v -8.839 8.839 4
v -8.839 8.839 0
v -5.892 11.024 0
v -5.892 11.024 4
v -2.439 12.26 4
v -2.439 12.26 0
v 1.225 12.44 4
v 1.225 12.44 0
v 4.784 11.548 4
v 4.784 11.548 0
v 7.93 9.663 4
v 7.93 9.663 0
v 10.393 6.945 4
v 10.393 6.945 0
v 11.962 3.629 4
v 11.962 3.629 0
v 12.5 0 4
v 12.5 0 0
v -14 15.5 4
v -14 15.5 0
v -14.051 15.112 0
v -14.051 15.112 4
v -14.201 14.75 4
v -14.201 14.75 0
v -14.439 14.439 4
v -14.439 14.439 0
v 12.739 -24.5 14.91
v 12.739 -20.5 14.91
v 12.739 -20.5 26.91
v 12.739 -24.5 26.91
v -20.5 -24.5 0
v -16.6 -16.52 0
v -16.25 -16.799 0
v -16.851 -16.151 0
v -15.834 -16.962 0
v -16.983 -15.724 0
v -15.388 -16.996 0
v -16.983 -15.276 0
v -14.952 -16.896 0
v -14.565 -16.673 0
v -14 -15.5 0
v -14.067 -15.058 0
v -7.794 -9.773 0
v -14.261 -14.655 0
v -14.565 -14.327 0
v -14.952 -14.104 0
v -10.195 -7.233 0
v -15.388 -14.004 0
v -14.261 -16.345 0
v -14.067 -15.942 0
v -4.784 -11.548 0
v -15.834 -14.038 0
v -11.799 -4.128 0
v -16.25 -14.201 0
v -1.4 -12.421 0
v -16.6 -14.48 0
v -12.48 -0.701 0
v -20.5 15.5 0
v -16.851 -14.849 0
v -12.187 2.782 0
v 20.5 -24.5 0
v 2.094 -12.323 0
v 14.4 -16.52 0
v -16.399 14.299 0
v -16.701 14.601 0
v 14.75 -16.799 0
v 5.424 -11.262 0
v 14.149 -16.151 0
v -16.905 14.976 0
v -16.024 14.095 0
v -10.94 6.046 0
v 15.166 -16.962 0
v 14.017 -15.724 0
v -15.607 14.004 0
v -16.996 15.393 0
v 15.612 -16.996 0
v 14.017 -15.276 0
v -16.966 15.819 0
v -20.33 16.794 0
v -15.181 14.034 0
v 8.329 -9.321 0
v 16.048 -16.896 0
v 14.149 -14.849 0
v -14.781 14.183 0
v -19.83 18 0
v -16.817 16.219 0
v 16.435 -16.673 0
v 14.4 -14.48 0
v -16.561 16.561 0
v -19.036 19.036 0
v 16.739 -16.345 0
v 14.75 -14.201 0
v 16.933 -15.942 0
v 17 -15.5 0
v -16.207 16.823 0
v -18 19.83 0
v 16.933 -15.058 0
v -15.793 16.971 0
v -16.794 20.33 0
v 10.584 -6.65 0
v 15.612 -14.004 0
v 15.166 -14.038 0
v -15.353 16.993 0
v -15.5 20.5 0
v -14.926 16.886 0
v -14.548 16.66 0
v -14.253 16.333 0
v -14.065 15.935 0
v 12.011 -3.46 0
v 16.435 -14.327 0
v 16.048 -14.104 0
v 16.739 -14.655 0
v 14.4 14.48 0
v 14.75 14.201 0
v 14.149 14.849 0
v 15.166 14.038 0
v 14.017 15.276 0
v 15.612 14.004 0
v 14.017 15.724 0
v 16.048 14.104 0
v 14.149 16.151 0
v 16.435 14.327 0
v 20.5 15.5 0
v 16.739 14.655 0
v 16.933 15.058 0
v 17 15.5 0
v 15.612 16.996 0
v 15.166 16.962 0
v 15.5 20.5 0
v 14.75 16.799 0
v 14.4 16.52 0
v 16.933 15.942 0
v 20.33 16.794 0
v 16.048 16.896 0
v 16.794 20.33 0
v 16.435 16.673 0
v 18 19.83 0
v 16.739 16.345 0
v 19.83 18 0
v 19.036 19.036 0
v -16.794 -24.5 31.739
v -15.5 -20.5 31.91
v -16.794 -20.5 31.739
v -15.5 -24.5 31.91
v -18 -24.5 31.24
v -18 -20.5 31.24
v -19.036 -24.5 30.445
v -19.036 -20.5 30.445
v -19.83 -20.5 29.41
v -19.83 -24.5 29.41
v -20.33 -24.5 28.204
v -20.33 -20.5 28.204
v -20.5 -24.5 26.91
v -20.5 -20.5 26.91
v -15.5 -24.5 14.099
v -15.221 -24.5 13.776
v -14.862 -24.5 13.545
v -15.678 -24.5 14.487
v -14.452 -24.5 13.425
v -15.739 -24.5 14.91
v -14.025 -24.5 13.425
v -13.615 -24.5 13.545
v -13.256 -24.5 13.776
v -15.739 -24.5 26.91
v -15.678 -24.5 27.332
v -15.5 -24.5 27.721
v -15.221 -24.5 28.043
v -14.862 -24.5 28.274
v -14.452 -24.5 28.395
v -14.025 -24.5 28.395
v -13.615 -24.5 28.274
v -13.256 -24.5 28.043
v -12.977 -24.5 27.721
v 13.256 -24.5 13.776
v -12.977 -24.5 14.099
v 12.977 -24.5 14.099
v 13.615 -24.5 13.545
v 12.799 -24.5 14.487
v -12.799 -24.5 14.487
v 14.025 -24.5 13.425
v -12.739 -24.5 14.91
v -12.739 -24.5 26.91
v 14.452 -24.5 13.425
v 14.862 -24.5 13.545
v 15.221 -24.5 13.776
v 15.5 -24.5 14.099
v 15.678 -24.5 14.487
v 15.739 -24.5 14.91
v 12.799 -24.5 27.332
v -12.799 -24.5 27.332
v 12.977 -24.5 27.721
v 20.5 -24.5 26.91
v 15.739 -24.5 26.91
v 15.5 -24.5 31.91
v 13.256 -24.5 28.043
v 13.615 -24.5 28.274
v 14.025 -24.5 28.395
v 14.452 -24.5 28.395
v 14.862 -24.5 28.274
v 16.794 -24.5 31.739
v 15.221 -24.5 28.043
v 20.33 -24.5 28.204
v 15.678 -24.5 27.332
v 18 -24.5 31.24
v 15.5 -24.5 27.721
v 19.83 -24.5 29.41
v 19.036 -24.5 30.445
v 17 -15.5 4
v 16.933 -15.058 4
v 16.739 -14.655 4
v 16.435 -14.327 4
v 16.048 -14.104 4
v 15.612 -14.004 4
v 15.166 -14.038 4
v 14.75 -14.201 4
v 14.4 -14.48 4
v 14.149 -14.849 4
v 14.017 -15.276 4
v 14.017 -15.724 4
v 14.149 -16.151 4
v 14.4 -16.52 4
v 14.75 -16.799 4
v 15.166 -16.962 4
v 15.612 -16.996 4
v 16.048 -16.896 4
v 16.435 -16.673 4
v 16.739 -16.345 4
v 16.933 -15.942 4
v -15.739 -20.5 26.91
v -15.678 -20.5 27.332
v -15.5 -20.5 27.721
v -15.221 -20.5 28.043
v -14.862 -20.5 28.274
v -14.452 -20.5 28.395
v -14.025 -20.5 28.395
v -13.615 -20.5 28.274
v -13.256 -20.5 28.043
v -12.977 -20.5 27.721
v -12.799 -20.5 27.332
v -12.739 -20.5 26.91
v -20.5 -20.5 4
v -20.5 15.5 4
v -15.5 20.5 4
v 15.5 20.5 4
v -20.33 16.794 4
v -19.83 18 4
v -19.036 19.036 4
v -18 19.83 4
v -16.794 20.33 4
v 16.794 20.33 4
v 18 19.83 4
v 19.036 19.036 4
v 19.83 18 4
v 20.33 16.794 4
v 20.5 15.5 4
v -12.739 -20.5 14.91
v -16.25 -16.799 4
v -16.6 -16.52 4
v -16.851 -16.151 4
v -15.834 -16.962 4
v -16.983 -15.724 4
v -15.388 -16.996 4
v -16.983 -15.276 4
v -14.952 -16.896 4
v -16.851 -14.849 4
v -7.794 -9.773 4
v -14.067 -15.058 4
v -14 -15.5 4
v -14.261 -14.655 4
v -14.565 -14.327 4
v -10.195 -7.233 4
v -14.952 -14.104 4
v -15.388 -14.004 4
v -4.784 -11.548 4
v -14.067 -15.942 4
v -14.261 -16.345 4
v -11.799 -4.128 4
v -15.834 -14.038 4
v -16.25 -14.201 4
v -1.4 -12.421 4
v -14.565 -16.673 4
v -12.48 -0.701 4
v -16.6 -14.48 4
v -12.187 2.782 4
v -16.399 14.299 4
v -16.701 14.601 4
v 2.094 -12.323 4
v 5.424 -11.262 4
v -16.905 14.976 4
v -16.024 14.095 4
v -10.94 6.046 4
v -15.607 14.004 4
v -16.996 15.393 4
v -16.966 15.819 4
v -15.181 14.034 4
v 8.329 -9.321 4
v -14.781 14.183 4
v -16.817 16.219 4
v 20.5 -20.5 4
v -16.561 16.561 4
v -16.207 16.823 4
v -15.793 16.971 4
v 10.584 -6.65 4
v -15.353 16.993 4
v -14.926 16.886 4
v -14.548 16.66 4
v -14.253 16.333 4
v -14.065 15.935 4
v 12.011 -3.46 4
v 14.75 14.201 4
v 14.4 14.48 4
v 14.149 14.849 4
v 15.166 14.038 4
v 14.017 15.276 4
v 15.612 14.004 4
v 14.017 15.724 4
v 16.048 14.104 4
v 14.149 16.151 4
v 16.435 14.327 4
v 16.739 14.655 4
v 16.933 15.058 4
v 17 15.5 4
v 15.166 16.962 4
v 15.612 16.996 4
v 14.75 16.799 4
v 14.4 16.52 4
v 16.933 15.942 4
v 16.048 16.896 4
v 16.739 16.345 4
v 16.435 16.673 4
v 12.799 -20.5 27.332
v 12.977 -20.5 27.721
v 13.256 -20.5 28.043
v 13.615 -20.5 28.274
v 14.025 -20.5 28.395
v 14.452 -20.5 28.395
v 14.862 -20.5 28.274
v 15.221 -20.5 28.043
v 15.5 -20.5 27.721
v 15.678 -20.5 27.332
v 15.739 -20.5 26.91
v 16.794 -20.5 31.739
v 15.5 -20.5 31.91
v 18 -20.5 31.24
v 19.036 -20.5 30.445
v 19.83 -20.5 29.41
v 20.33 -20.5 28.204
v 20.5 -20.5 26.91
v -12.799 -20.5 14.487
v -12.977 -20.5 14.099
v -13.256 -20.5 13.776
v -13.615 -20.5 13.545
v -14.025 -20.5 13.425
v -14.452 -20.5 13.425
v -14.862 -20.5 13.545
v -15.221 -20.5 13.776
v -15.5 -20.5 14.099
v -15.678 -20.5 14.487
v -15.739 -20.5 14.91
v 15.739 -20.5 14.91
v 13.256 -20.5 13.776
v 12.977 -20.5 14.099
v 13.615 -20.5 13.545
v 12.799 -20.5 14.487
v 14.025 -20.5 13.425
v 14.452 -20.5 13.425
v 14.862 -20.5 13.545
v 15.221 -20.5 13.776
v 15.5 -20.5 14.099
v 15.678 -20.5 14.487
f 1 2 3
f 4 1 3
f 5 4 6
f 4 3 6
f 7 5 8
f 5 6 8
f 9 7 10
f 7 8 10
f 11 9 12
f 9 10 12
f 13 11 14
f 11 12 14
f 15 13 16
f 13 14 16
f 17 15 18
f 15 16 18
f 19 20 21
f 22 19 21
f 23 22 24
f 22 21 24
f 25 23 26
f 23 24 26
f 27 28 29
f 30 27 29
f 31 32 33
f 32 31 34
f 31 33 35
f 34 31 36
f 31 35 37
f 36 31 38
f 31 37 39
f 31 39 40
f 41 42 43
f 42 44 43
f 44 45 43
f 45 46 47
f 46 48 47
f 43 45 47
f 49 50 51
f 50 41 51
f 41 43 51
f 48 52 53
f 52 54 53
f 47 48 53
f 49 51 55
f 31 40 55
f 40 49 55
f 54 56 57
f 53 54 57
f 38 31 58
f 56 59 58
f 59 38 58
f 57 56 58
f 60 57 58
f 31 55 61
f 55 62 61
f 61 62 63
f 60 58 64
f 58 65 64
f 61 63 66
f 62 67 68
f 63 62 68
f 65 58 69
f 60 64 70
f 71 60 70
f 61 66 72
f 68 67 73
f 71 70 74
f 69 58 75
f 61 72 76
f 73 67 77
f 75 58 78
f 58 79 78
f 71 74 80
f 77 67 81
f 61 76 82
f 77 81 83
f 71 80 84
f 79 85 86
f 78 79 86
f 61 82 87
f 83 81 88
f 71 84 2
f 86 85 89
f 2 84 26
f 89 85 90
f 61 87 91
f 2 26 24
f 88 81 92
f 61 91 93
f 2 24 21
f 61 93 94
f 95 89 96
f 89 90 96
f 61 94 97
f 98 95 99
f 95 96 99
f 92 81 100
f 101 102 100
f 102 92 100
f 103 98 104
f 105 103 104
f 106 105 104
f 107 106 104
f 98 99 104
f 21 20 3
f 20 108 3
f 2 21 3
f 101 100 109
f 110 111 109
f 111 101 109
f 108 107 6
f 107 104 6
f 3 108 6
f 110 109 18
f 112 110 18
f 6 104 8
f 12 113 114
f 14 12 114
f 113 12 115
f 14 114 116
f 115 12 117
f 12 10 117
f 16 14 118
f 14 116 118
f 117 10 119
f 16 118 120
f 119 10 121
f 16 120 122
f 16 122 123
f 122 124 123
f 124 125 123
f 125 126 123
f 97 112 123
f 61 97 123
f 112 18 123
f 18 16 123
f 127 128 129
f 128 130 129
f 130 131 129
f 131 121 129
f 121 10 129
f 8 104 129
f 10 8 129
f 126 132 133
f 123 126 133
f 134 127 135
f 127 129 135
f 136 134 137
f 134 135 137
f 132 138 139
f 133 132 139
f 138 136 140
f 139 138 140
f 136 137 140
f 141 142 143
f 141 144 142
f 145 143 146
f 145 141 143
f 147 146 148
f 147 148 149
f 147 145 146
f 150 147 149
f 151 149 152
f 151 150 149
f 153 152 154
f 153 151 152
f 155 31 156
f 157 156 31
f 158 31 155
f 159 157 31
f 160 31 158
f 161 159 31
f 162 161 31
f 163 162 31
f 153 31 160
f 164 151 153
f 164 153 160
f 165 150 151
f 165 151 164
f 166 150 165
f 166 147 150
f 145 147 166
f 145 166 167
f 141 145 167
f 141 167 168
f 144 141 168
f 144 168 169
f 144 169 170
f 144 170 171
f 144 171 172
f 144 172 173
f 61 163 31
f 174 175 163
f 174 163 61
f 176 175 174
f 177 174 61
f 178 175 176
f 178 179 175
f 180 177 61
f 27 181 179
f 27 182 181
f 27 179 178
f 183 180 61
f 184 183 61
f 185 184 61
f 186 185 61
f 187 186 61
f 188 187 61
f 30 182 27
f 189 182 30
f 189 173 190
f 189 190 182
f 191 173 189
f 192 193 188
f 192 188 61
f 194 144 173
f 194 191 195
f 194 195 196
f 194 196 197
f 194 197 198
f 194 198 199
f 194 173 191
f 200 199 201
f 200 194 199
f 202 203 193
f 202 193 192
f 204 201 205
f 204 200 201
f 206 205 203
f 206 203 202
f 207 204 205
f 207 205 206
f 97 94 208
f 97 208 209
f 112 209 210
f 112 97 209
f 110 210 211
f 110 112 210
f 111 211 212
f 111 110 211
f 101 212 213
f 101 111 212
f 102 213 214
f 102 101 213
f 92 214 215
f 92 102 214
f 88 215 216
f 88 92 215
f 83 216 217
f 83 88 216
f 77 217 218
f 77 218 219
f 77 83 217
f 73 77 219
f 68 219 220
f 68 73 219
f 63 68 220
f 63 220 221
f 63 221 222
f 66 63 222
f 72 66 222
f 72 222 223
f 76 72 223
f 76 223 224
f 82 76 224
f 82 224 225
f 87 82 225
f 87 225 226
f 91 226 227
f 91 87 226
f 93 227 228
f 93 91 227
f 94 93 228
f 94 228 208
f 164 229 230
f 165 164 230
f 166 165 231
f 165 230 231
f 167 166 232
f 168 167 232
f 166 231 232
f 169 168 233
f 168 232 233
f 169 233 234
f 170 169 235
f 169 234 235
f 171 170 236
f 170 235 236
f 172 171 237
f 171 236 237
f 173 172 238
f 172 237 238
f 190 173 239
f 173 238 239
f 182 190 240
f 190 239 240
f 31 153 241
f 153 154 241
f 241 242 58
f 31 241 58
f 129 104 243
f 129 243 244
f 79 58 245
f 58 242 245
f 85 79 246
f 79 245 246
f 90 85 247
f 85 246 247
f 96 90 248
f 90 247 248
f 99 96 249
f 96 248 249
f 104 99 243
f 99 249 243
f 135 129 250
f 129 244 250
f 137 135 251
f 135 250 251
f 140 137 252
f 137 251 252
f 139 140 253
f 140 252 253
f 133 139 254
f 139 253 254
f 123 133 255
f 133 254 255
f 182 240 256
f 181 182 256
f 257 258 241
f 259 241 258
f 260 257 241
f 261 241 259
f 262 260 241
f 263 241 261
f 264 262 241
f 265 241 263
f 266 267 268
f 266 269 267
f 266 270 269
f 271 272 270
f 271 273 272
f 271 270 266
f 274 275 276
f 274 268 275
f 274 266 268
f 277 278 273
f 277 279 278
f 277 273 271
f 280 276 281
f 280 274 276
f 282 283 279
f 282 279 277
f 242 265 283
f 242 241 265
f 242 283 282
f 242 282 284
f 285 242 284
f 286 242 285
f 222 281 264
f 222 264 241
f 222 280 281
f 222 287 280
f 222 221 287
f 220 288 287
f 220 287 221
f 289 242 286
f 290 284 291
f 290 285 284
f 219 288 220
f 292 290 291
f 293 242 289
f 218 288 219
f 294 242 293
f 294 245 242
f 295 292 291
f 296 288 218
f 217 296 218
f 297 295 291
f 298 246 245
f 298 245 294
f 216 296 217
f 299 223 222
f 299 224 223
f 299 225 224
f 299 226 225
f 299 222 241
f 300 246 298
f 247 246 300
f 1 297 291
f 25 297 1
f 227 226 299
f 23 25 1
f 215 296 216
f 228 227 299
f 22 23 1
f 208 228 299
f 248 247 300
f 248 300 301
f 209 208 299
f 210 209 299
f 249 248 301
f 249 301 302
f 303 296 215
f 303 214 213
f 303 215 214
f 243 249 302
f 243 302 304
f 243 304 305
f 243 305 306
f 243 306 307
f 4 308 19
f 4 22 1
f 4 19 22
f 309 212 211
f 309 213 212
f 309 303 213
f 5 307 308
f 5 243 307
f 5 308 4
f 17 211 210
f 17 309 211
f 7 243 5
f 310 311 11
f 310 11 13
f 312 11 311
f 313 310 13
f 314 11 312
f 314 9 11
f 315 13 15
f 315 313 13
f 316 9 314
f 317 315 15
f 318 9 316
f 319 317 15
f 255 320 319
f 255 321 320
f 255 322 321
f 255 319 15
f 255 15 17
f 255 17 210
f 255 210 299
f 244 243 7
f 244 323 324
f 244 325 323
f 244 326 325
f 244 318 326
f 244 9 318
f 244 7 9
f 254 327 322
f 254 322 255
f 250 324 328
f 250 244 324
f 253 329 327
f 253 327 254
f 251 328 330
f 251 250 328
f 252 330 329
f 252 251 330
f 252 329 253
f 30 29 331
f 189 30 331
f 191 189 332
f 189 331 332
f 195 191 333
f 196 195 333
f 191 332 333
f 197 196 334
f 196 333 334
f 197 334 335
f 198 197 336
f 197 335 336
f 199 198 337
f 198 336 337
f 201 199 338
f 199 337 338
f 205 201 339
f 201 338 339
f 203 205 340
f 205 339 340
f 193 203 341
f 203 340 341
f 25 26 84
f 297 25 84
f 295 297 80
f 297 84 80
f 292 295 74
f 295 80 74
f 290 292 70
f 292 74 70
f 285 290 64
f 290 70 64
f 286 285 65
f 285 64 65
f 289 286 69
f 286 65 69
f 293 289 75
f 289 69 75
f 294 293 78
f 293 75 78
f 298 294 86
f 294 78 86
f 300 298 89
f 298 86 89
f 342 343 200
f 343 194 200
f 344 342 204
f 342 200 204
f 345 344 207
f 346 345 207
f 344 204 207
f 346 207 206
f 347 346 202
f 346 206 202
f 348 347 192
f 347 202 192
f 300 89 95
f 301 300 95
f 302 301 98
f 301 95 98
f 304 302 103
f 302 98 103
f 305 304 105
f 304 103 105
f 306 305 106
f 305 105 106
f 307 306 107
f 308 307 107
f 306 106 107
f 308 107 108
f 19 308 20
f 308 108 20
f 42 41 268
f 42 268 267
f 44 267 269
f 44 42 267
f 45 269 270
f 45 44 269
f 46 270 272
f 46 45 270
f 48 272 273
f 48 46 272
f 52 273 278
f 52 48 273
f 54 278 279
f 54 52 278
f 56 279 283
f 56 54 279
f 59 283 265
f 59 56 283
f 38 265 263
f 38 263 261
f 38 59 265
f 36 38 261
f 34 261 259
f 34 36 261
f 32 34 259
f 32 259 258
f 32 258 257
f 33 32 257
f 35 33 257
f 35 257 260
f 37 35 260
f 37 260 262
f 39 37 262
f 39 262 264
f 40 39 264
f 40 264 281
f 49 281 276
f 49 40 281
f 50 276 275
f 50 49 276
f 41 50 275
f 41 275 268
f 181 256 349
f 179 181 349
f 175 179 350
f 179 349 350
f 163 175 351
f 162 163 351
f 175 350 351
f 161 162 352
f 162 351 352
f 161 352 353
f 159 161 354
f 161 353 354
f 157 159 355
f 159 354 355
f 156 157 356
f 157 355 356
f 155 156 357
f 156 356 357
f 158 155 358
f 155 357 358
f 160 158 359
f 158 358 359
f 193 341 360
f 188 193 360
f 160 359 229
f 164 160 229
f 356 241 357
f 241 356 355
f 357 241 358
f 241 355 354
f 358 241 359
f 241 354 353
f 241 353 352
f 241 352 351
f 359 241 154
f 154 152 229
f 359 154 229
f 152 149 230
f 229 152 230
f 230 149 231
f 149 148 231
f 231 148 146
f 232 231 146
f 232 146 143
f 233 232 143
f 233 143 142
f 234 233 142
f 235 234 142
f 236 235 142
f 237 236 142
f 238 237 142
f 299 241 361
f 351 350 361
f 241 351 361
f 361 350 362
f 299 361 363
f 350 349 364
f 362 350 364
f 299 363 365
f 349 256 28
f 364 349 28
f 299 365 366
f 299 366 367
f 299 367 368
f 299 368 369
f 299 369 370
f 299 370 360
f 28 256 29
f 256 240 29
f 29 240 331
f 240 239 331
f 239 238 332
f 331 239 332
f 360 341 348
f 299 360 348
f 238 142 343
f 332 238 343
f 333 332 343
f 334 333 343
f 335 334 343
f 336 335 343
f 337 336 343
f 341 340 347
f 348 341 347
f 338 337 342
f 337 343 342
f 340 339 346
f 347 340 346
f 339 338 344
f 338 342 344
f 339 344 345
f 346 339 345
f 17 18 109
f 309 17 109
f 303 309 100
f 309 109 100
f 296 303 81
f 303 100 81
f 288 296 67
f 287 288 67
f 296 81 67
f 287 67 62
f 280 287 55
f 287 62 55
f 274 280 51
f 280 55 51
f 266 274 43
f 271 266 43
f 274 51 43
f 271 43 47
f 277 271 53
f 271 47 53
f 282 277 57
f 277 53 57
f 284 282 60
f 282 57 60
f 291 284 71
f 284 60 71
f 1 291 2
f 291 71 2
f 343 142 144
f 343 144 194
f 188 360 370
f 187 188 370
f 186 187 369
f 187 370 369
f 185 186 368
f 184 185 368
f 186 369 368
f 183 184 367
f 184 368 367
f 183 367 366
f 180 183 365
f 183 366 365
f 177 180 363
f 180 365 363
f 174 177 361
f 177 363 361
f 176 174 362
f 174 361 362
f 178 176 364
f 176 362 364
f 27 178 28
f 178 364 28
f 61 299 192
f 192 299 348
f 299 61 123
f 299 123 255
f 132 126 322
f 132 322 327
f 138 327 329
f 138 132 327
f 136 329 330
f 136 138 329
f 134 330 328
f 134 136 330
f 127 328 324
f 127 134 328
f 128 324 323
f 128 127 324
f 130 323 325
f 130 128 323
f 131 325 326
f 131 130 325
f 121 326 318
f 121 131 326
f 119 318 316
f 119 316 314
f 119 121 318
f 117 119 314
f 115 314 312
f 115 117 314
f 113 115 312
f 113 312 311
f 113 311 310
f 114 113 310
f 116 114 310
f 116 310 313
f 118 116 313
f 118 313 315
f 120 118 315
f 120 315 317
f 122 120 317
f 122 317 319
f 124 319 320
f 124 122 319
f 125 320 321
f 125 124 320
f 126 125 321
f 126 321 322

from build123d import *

# Parameters (mm, degrees)
F0_W     = 41
F0_H     = 41
F0_R     = 1.5
F1_DEPTH = 4
F2_R     = 5
F3_W     = 41
F3_H     = 27.909843
F3_H_2   = 4
F4_DEPTH = 4
F5_R     = 5


with BuildPart() as f1:
    # F0 (on Top) → F1 (new body)
    with BuildSketch(Plane.XY):
        Rectangle(F0_W, F0_H)
        with Locations((-15.5, -15.5)):
            Circle(F0_R, mode=Mode.SUBTRACT)
        with Locations((15.5, -15.5)):
            Circle(F0_R, mode=Mode.SUBTRACT)
        with BuildLine():
            ThreePointArc((-14.43934, 14.43934), (-16.56066, 14.43934), (-16.56066, 16.56066))
            ThreePointArc((-16.56066, 16.56066), (-14.925975, 16.885819), (-14, 15.5))
            ThreePointArc((-14, 15.5), (-14.114181, 14.925975), (-14.43934, 14.43934))
        make_face(mode=Mode.SUBTRACT)
        with BuildLine():
            ThreePointArc((12.5, 0), (-4.783543, -11.548494), (-8.838835, 8.838835))
            ThreePointArc((-8.838835, 8.838835), (4.783543, 11.548494), (12.5, 0))
        make_face(mode=Mode.SUBTRACT)
        with Locations((15.5, 15.5)):
            Circle(F0_R, mode=Mode.SUBTRACT)
    extrude(amount=F1_DEPTH)

    # F2
    f2_edges = [f1.edges().sort_by_distance(p)[0] for p in [
        (-20.5, 20.5, 2),
        (20.5, 20.5, 2),
    ]]
    fillet(f2_edges, radius=F2_R)

    # F3 (on face) → F4 (join)
    with BuildSketch(Plane.XZ.offset(20.5)):
        with Locations((0, 17.954921)):
            Rectangle(F3_W, F3_H)
        with BuildLine():
            Line((-15.738551, 14.909843), (-15.738551, 26.909843))
            ThreePointArc((-15.738551, 26.909843), (-14.238551, 28.409843), (-12.738551, 26.909843))
            Line((-12.738551, 26.909843), (-12.738551, 14.909843))
            ThreePointArc((-12.738551, 14.909843), (-14.238551, 13.409843), (-15.738551, 14.909843))
        make_face(mode=Mode.SUBTRACT)
        with BuildLine():
            ThreePointArc((12.738551, 26.909843), (14.238551, 28.409843), (15.738551, 26.909843))
            Line((15.738551, 26.909843), (15.738551, 14.909843))
            ThreePointArc((15.738551, 14.909843), (14.238551, 13.409843), (12.738551, 14.909843))
            Line((12.738551, 14.909843), (12.738551, 26.909843))
        make_face(mode=Mode.SUBTRACT)
        with Locations((0, 2)):
            Rectangle(F3_W, F3_H_2)
    extrude(amount=F4_DEPTH)

    # F5
    f5_edges = [f1.edges().sort_by_distance(p)[0] for p in [
        (20.5, -22.5, 31.909843),
        (-20.5, -22.5, 31.909843),
    ]]
    fillet(f5_edges, radius=F5_R)


solid = f1.part
